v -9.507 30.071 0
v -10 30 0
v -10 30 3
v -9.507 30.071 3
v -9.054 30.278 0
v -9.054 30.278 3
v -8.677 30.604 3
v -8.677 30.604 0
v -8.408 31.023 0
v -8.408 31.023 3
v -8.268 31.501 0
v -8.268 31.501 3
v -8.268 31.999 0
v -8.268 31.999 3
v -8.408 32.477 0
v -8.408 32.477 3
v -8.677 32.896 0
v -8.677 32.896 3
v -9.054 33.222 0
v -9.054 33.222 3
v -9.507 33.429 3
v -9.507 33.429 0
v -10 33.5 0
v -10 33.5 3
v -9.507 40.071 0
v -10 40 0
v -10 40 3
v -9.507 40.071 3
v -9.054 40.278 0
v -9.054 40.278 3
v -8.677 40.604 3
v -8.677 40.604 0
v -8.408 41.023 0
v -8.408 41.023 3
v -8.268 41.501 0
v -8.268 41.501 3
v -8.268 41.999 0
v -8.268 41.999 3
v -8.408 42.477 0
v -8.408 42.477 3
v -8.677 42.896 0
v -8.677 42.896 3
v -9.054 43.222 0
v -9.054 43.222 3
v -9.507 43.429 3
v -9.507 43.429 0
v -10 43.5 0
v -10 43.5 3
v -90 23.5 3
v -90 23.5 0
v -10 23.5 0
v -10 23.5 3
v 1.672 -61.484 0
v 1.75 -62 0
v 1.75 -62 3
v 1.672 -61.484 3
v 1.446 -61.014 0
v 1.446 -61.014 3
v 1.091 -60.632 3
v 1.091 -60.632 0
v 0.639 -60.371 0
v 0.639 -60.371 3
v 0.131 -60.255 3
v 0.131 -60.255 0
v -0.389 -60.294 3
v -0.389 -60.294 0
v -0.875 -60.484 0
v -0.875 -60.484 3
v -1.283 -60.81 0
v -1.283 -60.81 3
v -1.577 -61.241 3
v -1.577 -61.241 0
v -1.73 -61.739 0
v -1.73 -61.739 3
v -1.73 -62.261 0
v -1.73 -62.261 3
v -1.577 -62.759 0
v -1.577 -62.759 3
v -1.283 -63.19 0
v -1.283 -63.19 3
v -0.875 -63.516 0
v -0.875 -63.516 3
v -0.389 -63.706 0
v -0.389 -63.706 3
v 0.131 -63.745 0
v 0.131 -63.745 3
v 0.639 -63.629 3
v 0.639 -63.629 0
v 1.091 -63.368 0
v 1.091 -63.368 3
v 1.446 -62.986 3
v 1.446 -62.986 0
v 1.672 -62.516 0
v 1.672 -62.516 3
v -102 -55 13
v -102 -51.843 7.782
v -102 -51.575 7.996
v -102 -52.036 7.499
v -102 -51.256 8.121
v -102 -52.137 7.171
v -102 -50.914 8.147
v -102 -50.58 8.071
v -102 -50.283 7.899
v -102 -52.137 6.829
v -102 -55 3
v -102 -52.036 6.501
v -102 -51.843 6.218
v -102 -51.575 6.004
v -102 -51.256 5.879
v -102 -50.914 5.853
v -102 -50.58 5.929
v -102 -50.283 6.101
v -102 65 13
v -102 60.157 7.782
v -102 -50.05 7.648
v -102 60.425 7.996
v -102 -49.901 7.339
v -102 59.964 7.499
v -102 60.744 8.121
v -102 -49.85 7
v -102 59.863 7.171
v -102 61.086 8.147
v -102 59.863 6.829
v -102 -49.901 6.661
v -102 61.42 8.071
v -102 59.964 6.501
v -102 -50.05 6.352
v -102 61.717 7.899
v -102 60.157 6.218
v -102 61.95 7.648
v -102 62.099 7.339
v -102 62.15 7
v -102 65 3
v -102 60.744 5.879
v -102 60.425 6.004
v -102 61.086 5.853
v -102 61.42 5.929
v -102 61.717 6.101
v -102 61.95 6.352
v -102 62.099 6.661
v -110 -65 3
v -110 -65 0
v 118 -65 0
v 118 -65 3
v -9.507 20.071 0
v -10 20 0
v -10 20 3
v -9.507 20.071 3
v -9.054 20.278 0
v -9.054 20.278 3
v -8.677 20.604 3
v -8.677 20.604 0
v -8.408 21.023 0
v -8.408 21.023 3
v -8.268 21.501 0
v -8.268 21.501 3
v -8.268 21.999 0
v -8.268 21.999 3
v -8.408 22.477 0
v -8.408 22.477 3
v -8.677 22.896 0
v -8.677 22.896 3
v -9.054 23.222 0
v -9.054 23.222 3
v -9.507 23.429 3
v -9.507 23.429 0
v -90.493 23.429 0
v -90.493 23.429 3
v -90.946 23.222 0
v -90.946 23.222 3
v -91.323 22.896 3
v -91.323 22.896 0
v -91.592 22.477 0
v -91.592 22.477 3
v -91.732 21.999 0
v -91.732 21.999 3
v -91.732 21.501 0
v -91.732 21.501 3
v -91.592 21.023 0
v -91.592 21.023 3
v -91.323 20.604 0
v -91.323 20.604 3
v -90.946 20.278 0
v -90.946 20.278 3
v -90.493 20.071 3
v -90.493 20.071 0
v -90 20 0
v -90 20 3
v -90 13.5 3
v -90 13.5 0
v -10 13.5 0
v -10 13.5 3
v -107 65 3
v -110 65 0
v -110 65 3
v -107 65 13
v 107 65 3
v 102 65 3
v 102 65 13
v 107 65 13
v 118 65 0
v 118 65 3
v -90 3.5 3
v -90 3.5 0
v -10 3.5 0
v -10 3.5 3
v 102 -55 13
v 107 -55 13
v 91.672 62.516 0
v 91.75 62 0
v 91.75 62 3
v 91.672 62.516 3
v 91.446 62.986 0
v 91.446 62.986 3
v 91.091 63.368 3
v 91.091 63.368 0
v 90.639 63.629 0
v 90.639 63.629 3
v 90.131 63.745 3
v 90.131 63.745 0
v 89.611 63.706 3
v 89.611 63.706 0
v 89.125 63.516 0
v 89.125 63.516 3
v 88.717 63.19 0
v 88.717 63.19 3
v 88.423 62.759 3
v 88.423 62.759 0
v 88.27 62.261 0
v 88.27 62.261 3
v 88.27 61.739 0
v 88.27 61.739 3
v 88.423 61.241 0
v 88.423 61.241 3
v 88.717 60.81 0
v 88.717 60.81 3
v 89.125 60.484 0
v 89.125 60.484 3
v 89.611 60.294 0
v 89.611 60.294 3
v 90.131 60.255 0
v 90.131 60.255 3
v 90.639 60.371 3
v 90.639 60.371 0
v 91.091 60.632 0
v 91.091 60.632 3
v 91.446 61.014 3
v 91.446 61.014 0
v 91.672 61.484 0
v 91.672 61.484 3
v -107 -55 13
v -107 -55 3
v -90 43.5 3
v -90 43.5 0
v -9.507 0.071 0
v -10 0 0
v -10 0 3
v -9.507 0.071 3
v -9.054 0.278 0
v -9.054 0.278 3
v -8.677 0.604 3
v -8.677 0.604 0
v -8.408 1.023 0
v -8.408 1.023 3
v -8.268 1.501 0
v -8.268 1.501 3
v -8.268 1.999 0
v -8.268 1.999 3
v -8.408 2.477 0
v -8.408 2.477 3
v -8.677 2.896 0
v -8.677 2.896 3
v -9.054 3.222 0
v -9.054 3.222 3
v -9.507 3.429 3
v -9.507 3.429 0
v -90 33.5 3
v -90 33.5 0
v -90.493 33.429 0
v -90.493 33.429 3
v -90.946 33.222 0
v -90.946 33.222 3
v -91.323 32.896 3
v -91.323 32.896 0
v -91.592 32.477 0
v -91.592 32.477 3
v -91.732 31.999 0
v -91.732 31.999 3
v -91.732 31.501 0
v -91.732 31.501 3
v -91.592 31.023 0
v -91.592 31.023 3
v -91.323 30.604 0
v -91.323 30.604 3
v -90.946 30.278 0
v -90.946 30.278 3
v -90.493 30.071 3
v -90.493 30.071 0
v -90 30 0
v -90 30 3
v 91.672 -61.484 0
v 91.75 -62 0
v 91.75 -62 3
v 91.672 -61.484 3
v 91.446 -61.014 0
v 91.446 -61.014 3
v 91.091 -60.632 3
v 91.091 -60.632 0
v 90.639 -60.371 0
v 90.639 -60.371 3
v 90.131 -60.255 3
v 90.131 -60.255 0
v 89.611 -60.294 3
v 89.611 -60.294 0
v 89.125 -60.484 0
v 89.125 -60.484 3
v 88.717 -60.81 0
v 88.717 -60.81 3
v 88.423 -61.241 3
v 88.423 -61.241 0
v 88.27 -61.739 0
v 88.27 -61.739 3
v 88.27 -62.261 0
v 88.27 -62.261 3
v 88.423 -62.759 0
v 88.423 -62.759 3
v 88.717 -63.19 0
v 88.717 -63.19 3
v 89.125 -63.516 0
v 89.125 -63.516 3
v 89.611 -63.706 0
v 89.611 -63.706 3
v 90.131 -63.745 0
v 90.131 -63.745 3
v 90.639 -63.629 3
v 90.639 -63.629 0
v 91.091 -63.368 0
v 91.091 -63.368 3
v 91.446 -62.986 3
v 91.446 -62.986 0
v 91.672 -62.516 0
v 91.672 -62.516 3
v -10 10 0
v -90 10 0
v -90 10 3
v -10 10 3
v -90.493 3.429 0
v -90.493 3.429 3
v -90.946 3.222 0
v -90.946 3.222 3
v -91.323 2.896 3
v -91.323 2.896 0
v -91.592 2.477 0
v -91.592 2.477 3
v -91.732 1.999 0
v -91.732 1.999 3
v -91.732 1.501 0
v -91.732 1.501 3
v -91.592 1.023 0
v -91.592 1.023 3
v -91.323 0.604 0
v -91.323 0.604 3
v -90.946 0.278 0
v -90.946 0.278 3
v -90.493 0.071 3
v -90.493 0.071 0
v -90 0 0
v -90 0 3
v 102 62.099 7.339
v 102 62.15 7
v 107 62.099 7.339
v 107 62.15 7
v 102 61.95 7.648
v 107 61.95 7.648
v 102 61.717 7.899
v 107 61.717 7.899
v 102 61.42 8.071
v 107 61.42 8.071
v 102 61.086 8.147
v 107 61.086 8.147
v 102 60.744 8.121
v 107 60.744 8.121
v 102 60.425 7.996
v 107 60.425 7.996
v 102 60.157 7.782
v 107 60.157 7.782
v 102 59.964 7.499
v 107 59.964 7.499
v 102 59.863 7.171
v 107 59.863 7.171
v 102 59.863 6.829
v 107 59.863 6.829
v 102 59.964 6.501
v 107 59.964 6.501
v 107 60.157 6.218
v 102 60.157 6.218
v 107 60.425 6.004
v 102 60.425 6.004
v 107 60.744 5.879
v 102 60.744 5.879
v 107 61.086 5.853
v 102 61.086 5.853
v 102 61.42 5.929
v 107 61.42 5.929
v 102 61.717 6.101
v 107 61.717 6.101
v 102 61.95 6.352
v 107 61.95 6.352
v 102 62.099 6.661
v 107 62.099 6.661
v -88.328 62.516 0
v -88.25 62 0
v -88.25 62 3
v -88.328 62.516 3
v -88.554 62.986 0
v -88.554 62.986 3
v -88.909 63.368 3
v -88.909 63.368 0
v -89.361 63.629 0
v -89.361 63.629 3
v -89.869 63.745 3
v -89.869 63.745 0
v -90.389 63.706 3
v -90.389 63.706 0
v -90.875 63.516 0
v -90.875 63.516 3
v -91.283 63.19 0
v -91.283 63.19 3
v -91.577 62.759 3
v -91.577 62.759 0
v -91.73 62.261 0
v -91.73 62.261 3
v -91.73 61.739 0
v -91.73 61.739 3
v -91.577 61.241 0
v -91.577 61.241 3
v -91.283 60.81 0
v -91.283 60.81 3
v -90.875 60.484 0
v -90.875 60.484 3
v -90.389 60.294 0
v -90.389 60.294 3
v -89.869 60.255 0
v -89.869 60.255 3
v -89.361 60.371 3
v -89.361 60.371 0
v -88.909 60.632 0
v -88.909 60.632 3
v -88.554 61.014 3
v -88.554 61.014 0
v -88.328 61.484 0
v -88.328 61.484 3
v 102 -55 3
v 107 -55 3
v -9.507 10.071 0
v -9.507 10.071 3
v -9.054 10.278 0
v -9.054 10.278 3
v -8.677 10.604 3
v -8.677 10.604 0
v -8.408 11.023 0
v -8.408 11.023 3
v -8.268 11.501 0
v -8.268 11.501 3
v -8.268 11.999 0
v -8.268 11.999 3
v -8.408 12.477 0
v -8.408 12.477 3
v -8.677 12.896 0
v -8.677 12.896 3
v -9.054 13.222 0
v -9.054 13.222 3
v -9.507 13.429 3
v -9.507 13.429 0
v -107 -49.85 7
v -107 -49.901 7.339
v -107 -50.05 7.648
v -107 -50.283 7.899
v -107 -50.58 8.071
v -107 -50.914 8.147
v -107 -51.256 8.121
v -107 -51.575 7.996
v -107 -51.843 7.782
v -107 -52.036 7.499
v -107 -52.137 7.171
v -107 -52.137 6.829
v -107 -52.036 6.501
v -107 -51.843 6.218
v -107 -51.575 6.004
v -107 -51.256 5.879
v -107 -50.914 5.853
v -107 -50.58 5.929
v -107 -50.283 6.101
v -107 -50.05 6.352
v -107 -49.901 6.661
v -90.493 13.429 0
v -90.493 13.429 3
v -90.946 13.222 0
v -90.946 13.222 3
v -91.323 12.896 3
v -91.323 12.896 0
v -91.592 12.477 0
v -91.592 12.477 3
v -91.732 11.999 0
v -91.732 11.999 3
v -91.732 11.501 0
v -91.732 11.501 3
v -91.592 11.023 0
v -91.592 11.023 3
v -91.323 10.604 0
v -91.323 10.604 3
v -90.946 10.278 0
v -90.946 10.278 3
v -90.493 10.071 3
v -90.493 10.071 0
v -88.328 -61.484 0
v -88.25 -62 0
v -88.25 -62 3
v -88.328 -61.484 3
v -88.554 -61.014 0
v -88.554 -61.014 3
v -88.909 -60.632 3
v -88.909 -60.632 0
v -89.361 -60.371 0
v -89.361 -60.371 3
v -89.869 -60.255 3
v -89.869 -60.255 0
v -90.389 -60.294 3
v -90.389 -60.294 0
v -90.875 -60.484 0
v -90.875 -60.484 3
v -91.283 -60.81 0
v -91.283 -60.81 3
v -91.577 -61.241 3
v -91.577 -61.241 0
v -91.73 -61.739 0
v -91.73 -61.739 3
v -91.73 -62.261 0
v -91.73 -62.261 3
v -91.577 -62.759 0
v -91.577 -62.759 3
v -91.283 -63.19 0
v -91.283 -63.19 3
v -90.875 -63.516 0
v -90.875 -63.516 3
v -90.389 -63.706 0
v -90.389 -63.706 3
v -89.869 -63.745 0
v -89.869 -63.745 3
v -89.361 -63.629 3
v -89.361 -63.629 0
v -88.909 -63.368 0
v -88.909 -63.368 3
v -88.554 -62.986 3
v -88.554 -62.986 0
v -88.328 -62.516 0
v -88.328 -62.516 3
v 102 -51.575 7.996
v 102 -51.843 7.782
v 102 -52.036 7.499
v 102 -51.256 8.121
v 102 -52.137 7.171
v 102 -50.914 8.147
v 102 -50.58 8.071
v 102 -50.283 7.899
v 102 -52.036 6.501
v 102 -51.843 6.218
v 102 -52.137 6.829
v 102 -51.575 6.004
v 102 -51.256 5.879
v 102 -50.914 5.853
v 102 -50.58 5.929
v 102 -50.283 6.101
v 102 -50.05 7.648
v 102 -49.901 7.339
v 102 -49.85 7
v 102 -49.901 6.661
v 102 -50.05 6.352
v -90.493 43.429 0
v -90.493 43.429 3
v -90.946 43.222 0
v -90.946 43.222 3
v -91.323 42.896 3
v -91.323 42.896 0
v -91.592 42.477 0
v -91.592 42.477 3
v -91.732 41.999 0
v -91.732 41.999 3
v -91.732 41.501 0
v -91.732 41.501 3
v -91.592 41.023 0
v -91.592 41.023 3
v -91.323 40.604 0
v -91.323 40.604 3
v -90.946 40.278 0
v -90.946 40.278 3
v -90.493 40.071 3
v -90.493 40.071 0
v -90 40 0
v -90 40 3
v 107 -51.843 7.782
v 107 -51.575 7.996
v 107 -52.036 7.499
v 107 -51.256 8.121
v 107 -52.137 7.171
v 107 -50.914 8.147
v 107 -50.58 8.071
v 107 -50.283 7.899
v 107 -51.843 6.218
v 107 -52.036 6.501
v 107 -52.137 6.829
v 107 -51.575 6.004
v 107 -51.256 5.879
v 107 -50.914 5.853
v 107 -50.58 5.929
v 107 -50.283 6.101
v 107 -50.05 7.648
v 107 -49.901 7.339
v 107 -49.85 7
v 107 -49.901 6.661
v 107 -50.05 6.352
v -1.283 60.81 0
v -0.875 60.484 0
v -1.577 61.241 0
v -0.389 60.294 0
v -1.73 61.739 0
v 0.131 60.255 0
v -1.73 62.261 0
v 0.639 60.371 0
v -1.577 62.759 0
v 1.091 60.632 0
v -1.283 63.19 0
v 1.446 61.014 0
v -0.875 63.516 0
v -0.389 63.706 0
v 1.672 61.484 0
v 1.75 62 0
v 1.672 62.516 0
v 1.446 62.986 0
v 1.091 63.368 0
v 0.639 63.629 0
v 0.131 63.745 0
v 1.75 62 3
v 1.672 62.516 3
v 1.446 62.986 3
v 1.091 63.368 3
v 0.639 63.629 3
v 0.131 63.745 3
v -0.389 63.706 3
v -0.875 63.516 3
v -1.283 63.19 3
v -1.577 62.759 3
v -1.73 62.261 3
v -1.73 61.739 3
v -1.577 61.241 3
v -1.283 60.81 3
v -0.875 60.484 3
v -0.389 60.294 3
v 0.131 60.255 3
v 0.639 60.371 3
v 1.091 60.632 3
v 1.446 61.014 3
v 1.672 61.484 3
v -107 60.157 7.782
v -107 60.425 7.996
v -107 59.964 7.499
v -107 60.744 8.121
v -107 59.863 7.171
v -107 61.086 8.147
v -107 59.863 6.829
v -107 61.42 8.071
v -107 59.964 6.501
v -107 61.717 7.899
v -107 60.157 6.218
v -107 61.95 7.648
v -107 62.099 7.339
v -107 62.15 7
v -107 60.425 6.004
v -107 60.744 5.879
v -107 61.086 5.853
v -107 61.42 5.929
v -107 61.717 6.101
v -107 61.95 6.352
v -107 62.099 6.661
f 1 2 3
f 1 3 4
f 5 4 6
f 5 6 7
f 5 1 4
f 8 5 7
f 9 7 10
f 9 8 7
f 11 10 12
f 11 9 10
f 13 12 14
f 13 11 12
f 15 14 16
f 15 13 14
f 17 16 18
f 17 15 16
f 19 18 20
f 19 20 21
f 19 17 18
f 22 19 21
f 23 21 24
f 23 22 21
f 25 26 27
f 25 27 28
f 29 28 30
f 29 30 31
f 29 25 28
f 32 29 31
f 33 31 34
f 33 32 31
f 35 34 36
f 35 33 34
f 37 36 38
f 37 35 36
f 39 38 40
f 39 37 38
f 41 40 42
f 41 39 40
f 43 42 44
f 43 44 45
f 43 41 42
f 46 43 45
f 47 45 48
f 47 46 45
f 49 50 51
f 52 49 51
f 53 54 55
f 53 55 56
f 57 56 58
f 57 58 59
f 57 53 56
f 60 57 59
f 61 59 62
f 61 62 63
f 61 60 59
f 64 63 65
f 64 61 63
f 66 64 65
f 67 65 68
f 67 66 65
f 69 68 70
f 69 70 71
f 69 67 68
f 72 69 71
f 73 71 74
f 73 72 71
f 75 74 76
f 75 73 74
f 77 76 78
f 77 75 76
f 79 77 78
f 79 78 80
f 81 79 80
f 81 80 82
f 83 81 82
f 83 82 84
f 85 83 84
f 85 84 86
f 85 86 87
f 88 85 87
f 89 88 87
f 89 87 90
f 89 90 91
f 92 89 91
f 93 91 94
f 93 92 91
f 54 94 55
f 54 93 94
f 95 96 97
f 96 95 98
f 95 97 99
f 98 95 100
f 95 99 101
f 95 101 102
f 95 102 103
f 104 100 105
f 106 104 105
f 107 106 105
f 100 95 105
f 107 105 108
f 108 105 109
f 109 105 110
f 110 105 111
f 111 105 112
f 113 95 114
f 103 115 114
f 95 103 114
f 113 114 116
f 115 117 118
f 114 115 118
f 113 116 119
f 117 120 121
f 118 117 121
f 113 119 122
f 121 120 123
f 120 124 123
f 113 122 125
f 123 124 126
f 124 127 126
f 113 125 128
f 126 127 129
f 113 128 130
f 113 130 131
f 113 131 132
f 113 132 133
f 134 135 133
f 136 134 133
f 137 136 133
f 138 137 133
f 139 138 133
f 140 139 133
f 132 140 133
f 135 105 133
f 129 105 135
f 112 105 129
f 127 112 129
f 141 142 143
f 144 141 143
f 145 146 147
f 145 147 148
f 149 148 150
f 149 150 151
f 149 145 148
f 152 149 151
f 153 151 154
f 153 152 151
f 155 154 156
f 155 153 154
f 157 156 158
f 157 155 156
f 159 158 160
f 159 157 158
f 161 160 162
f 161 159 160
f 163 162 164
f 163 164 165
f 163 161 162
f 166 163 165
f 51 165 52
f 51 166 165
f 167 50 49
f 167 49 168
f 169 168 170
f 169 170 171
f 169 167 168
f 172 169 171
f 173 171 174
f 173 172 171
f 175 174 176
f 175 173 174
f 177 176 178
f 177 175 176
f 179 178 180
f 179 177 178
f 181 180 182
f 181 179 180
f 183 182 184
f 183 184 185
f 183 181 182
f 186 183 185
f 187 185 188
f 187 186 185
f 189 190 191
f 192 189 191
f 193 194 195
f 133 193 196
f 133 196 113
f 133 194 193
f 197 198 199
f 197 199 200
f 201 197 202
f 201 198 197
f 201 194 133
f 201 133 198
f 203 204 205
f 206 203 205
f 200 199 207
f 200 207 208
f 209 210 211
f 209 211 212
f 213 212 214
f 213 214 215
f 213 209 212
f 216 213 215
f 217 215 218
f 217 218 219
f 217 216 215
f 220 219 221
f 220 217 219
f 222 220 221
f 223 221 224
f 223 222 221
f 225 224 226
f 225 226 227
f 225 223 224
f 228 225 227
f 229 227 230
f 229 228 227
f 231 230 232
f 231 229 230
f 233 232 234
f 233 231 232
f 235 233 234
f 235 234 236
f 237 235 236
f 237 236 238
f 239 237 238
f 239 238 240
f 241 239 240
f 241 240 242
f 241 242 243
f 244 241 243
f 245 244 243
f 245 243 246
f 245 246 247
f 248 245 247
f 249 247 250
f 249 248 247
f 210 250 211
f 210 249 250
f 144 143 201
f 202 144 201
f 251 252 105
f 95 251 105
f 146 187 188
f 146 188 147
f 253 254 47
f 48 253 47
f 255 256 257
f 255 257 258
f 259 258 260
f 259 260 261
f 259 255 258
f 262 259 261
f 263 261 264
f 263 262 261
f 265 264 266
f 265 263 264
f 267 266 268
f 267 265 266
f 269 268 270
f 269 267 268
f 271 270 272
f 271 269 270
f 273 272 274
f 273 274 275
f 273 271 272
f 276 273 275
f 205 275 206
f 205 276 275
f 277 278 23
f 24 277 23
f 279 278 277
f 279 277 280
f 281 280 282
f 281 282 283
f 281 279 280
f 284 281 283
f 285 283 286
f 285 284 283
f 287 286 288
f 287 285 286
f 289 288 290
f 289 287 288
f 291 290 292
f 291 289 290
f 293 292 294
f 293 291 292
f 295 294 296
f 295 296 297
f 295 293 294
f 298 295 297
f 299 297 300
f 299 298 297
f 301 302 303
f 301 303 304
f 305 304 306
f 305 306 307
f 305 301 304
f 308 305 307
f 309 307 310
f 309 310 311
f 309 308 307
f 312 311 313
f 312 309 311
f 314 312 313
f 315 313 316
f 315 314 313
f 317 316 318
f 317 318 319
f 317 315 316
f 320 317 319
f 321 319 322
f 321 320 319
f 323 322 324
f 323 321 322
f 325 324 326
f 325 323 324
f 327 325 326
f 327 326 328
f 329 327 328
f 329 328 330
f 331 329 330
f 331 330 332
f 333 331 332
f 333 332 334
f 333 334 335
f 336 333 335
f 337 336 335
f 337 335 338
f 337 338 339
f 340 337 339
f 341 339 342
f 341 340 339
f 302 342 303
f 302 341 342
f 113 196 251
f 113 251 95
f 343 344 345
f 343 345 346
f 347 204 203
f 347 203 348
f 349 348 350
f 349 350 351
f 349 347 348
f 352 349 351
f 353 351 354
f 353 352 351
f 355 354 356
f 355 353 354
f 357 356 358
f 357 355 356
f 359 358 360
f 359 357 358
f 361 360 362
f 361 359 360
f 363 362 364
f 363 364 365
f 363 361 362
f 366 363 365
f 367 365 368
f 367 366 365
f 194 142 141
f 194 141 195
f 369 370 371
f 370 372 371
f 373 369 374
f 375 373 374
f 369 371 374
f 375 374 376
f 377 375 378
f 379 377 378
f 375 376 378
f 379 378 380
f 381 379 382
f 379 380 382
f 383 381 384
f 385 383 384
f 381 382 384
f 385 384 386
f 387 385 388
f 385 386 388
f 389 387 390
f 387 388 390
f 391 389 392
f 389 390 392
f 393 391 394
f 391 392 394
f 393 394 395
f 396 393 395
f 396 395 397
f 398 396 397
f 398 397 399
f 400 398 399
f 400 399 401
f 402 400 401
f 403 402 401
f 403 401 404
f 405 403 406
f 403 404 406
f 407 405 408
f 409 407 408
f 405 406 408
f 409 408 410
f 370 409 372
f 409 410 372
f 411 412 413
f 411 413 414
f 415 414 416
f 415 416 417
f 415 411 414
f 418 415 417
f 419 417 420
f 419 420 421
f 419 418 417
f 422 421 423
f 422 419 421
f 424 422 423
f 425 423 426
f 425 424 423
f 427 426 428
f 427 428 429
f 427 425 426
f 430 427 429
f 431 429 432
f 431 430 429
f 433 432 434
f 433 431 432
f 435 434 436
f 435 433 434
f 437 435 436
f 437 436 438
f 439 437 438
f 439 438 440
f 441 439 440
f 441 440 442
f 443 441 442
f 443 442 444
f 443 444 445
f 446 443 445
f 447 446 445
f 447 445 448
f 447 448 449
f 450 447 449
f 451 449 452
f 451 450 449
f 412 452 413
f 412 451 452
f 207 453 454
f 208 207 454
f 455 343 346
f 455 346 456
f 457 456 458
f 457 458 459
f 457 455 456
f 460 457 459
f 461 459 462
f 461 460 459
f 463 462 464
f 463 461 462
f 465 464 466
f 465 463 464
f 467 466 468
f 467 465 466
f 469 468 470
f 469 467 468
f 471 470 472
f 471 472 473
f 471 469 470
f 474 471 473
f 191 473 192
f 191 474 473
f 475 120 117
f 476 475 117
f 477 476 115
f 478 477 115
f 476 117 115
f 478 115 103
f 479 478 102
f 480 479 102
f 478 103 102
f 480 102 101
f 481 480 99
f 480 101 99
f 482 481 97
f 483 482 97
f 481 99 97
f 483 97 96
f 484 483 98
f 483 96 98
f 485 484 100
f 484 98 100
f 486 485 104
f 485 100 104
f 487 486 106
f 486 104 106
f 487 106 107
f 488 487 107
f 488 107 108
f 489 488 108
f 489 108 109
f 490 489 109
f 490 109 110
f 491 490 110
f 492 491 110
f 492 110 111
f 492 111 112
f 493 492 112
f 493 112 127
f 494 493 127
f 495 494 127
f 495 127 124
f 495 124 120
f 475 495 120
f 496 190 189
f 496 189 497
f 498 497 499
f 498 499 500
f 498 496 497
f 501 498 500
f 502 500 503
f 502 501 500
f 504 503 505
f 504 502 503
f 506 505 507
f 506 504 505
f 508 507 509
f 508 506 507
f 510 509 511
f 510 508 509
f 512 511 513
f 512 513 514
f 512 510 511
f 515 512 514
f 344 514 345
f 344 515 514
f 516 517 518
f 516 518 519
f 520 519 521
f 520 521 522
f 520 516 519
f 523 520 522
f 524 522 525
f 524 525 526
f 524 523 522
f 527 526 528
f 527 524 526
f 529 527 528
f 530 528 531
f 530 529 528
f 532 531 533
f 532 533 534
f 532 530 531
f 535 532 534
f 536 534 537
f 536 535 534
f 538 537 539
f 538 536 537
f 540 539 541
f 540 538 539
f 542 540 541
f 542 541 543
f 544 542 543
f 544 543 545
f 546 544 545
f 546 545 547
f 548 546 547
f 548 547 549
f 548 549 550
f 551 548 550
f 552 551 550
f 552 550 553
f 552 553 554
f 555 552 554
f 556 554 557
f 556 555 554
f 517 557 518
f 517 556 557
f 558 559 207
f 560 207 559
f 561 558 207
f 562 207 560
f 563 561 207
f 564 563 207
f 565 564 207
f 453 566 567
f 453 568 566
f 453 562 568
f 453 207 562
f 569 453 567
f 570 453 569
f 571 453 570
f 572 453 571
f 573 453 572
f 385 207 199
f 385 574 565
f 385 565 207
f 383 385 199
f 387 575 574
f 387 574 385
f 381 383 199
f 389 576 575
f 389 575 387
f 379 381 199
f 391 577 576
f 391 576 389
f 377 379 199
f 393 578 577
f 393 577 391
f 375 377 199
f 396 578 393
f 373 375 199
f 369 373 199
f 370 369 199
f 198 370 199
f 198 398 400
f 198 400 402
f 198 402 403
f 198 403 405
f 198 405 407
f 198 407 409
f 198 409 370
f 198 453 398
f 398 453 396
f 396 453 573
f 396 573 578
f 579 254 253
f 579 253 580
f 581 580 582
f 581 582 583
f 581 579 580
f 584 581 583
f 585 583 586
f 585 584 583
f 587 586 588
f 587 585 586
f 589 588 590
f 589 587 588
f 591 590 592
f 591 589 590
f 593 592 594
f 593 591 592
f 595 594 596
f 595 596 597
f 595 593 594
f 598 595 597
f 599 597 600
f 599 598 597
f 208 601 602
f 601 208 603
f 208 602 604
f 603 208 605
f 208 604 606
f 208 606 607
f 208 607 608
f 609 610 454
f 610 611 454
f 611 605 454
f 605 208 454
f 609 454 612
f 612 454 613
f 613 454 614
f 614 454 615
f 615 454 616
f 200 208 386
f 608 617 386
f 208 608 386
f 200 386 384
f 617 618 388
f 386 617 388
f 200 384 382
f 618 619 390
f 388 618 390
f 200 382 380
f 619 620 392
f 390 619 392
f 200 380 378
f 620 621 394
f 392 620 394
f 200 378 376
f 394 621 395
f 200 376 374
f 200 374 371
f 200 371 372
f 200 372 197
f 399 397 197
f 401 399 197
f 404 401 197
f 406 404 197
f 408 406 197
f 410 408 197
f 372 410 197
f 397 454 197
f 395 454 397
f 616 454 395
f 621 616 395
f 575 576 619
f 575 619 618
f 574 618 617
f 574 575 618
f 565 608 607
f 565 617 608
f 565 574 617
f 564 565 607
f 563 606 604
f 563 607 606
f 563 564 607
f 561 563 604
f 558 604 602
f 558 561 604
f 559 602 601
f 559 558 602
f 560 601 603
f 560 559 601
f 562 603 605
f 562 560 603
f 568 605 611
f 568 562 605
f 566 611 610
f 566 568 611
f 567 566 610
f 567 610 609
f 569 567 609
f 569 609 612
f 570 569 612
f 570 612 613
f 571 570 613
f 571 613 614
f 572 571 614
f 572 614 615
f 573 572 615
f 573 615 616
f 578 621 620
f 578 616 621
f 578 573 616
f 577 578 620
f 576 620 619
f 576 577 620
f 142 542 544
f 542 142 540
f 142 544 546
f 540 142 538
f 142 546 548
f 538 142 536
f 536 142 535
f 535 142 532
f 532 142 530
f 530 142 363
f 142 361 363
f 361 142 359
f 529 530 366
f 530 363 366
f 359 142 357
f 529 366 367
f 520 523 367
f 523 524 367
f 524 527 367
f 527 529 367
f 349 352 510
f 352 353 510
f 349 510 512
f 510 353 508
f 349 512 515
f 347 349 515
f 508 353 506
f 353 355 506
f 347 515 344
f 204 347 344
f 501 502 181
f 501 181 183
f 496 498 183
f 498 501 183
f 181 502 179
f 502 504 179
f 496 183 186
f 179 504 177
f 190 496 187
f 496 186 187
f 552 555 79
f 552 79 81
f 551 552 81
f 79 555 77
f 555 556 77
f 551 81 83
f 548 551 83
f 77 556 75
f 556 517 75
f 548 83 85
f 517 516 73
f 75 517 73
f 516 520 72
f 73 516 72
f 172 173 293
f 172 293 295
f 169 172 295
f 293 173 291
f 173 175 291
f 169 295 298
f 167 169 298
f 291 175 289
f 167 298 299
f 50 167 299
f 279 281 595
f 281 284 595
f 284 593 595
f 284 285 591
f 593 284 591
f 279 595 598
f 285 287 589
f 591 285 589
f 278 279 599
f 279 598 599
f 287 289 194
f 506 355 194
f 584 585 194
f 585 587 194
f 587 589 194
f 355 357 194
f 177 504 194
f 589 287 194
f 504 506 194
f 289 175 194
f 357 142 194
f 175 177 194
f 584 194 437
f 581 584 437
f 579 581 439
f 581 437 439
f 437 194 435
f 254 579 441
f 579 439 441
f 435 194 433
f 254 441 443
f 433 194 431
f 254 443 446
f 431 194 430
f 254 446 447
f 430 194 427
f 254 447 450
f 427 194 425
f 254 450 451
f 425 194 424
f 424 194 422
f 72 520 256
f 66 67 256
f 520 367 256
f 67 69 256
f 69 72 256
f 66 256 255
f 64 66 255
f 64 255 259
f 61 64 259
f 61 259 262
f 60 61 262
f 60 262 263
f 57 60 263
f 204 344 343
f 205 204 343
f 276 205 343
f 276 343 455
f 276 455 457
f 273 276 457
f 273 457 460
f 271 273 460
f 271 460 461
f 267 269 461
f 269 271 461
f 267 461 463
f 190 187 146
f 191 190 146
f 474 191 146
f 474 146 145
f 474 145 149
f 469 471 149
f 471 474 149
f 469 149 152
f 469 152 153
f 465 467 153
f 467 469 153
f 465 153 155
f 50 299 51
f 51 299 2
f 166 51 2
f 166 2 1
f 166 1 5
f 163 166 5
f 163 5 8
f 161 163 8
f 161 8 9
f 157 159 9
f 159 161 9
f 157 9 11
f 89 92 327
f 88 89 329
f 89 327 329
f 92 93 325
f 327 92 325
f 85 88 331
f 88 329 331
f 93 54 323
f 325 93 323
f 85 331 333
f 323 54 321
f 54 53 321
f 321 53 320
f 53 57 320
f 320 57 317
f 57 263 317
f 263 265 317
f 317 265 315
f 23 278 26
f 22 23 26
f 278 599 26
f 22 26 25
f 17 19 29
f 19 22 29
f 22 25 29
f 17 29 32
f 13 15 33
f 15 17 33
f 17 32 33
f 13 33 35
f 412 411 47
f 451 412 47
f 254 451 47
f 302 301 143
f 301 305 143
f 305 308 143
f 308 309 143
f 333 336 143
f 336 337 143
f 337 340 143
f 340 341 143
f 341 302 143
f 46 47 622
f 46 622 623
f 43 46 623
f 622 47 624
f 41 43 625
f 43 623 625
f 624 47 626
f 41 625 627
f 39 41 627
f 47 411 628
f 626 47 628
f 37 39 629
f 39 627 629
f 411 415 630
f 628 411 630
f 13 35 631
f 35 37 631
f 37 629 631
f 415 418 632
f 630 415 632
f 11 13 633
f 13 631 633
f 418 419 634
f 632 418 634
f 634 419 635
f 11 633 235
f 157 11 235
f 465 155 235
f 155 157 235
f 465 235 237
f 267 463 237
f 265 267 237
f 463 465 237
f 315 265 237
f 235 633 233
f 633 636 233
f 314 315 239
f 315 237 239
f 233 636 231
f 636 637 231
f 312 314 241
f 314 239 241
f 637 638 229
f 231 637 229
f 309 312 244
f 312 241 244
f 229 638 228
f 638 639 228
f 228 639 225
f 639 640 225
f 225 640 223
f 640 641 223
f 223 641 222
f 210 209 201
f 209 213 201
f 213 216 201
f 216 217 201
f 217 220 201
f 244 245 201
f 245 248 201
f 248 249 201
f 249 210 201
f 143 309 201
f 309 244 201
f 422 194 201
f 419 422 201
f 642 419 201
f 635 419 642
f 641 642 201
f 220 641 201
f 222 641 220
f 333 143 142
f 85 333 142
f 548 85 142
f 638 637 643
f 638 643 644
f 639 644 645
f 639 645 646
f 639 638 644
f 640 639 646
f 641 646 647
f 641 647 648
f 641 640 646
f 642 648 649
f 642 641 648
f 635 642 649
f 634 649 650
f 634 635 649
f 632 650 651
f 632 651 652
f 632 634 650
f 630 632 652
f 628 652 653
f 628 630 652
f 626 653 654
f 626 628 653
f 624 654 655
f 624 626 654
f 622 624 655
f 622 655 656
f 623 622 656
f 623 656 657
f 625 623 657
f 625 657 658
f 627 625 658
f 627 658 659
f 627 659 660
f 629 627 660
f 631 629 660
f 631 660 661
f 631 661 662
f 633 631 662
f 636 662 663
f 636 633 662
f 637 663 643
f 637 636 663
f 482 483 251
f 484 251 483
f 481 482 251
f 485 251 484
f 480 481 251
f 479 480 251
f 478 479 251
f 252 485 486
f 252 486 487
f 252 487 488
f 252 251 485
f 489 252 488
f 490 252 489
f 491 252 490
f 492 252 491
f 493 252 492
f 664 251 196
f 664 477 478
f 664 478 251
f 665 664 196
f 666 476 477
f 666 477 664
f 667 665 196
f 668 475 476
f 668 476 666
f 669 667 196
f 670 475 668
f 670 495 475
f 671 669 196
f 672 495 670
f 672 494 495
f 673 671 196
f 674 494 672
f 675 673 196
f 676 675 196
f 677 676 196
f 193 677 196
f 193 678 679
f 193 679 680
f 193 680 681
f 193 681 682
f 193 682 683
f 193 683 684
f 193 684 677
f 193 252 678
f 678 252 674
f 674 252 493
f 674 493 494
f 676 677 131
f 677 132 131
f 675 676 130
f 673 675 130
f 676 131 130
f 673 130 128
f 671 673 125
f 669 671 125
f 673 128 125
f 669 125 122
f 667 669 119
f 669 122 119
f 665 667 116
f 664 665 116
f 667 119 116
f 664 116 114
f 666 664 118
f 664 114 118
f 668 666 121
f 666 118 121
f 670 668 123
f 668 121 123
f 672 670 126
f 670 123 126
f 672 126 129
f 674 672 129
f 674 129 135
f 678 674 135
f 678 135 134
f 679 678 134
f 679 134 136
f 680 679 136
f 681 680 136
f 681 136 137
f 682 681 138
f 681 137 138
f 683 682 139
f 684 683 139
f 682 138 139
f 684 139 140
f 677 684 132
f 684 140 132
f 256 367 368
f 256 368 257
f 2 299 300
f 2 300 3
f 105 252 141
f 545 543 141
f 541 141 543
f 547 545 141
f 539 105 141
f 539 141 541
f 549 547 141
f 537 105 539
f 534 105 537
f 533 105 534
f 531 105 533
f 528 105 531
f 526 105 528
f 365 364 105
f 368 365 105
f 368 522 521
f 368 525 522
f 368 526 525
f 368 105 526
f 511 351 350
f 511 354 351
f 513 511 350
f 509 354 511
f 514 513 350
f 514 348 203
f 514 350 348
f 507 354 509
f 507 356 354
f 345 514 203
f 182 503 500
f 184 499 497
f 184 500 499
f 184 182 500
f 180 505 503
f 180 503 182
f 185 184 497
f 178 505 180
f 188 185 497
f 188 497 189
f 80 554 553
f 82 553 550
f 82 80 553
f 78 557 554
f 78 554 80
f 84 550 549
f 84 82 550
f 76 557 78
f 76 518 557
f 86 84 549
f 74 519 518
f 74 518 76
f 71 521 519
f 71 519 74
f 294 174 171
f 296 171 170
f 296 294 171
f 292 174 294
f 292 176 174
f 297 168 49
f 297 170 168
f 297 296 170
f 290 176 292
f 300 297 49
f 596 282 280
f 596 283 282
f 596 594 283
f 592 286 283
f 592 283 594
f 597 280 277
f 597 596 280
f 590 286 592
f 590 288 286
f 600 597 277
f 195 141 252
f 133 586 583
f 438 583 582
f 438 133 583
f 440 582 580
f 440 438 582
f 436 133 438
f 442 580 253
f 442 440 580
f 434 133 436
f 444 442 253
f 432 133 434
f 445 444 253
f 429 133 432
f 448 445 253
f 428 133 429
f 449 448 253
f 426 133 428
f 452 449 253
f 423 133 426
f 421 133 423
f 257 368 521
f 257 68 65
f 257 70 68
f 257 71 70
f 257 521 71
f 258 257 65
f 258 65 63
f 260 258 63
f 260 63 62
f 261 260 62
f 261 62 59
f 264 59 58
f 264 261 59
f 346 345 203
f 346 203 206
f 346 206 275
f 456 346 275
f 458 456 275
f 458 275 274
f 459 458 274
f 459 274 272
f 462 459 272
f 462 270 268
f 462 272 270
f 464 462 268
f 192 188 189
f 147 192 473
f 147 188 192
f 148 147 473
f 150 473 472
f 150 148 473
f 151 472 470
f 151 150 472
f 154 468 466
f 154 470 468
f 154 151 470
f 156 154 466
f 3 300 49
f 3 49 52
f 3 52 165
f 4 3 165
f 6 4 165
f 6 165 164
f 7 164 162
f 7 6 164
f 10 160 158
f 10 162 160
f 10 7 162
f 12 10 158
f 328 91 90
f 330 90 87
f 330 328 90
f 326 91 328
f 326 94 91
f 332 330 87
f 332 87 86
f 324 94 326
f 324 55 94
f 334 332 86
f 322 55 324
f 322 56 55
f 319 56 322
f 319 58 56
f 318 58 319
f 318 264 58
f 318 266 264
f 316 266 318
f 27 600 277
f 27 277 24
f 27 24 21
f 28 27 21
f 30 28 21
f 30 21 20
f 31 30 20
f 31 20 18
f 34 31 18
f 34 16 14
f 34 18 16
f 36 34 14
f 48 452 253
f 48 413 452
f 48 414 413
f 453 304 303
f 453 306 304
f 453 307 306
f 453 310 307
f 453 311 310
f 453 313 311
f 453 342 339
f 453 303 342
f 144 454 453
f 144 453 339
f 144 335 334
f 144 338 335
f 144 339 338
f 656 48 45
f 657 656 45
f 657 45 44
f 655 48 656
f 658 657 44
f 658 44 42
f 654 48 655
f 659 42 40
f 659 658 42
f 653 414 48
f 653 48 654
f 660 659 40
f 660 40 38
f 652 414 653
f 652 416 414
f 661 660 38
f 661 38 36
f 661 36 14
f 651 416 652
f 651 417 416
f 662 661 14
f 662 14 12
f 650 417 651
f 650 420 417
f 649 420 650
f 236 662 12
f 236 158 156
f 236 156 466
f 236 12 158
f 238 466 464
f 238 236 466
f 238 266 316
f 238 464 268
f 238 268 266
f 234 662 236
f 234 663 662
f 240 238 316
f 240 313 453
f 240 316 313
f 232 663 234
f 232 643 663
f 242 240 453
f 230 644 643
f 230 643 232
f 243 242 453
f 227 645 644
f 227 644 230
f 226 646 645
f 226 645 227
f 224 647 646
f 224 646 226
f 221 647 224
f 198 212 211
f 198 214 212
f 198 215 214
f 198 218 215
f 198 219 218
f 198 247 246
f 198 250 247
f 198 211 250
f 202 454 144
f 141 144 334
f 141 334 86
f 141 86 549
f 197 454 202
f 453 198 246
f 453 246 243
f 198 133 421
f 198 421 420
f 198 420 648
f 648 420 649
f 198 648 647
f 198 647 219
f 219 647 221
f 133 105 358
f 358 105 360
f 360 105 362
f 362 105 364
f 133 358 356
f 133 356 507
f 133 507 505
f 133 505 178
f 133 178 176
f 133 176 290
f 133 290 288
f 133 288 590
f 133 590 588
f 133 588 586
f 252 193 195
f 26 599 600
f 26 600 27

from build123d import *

# Parameters (mm, degrees)
SKETCH_W     = 228
SKETCH_H     = 130
SKETCH_R     = 1.75
PAD_DEPTH    = 3
SKETCH001_W  = 5
SKETCH001_H  = 120
PAD001_DEPTH = 13
SKETCH002_R  = 1.15
POCKET_DEPTH = 112.5


with BuildPart() as part:
    # Sketch → Pad (new body)
    with BuildSketch(Plane.XY):
        with Locations((4, 0)):
            Rectangle(SKETCH_W, SKETCH_H)
        with Locations((-90, 62)):
            Circle(SKETCH_R, mode=Mode.SUBTRACT)
        with Locations((0, 62)):
            Circle(SKETCH_R, mode=Mode.SUBTRACT)
        with Locations((90, 62)):
            Circle(SKETCH_R, mode=Mode.SUBTRACT)
        with Locations((-90, -62)):
            Circle(SKETCH_R, mode=Mode.SUBTRACT)
        with Locations((0, -62)):
            Circle(SKETCH_R, mode=Mode.SUBTRACT)
        with Locations((90, -62)):
            Circle(SKETCH_R, mode=Mode.SUBTRACT)
        with BuildLine():
            ThreePointArc((-90, 43.5), (-91.75, 41.75), (-90, 40))
            Line((-90, 40), (-10, 40))
            ThreePointArc((-10, 40), (-8.25, 41.75), (-10, 43.5))
            Line((-90, 43.5), (-10, 43.5))
        make_face(mode=Mode.SUBTRACT)
        with BuildLine():
            ThreePointArc((-90, 33.5), (-91.75, 31.75), (-90, 30))
            Line((-90, 30), (-10, 30))
            ThreePointArc((-10, 30), (-8.25, 31.75), (-10, 33.5))
            Line((-90, 33.5), (-10, 33.5))
        make_face(mode=Mode.SUBTRACT)
        with BuildLine():
            ThreePointArc((-90, 23.5), (-91.75, 21.75), (-90, 20))
            Line((-90, 20), (-10, 20))
            ThreePointArc((-10, 20), (-8.25, 21.75), (-10, 23.5))
            Line((-90, 23.5), (-10, 23.5))
        make_face(mode=Mode.SUBTRACT)
        with BuildLine():
            ThreePointArc((-90, 13.5), (-91.75, 11.75), (-90, 10))
            Line((-90, 10), (-10, 10))
            ThreePointArc((-10, 10), (-8.25, 11.75), (-10, 13.5))
            Line((-90, 13.5), (-10, 13.5))
        make_face(mode=Mode.SUBTRACT)
        with BuildLine():
            ThreePointArc((-90, 3.5), (-91.75, 1.75), (-90, 0))
            Line((-90, 0), (-10, 0))
            ThreePointArc((-10, 0), (-8.25, 1.75), (-10, 3.5))
            Line((-90, 3.5), (-10, 3.5))
        make_face(mode=Mode.SUBTRACT)
    extrude(amount=PAD_DEPTH)

    # Sketch001 → Pad001 (join)
    with BuildSketch(Plane.XY):
        with Locations((104.5, 5)):
            Rectangle(SKETCH001_W, SKETCH001_H)
        with Locations((-104.5, 5)):
            Rectangle(SKETCH001_W, SKETCH001_H)
    extrude(amount=PAD001_DEPTH)

    # Sketch002 → Pocket (cut, symmetric)
    with BuildSketch(Plane.YZ):
        with Locations((-51, 7)):
            Circle(SKETCH002_R)
        with Locations((61, 7)):
            Circle(SKETCH002_R)
    extrude(amount=POCKET_DEPTH, both=True, mode=Mode.SUBTRACT)


solid = part.part
